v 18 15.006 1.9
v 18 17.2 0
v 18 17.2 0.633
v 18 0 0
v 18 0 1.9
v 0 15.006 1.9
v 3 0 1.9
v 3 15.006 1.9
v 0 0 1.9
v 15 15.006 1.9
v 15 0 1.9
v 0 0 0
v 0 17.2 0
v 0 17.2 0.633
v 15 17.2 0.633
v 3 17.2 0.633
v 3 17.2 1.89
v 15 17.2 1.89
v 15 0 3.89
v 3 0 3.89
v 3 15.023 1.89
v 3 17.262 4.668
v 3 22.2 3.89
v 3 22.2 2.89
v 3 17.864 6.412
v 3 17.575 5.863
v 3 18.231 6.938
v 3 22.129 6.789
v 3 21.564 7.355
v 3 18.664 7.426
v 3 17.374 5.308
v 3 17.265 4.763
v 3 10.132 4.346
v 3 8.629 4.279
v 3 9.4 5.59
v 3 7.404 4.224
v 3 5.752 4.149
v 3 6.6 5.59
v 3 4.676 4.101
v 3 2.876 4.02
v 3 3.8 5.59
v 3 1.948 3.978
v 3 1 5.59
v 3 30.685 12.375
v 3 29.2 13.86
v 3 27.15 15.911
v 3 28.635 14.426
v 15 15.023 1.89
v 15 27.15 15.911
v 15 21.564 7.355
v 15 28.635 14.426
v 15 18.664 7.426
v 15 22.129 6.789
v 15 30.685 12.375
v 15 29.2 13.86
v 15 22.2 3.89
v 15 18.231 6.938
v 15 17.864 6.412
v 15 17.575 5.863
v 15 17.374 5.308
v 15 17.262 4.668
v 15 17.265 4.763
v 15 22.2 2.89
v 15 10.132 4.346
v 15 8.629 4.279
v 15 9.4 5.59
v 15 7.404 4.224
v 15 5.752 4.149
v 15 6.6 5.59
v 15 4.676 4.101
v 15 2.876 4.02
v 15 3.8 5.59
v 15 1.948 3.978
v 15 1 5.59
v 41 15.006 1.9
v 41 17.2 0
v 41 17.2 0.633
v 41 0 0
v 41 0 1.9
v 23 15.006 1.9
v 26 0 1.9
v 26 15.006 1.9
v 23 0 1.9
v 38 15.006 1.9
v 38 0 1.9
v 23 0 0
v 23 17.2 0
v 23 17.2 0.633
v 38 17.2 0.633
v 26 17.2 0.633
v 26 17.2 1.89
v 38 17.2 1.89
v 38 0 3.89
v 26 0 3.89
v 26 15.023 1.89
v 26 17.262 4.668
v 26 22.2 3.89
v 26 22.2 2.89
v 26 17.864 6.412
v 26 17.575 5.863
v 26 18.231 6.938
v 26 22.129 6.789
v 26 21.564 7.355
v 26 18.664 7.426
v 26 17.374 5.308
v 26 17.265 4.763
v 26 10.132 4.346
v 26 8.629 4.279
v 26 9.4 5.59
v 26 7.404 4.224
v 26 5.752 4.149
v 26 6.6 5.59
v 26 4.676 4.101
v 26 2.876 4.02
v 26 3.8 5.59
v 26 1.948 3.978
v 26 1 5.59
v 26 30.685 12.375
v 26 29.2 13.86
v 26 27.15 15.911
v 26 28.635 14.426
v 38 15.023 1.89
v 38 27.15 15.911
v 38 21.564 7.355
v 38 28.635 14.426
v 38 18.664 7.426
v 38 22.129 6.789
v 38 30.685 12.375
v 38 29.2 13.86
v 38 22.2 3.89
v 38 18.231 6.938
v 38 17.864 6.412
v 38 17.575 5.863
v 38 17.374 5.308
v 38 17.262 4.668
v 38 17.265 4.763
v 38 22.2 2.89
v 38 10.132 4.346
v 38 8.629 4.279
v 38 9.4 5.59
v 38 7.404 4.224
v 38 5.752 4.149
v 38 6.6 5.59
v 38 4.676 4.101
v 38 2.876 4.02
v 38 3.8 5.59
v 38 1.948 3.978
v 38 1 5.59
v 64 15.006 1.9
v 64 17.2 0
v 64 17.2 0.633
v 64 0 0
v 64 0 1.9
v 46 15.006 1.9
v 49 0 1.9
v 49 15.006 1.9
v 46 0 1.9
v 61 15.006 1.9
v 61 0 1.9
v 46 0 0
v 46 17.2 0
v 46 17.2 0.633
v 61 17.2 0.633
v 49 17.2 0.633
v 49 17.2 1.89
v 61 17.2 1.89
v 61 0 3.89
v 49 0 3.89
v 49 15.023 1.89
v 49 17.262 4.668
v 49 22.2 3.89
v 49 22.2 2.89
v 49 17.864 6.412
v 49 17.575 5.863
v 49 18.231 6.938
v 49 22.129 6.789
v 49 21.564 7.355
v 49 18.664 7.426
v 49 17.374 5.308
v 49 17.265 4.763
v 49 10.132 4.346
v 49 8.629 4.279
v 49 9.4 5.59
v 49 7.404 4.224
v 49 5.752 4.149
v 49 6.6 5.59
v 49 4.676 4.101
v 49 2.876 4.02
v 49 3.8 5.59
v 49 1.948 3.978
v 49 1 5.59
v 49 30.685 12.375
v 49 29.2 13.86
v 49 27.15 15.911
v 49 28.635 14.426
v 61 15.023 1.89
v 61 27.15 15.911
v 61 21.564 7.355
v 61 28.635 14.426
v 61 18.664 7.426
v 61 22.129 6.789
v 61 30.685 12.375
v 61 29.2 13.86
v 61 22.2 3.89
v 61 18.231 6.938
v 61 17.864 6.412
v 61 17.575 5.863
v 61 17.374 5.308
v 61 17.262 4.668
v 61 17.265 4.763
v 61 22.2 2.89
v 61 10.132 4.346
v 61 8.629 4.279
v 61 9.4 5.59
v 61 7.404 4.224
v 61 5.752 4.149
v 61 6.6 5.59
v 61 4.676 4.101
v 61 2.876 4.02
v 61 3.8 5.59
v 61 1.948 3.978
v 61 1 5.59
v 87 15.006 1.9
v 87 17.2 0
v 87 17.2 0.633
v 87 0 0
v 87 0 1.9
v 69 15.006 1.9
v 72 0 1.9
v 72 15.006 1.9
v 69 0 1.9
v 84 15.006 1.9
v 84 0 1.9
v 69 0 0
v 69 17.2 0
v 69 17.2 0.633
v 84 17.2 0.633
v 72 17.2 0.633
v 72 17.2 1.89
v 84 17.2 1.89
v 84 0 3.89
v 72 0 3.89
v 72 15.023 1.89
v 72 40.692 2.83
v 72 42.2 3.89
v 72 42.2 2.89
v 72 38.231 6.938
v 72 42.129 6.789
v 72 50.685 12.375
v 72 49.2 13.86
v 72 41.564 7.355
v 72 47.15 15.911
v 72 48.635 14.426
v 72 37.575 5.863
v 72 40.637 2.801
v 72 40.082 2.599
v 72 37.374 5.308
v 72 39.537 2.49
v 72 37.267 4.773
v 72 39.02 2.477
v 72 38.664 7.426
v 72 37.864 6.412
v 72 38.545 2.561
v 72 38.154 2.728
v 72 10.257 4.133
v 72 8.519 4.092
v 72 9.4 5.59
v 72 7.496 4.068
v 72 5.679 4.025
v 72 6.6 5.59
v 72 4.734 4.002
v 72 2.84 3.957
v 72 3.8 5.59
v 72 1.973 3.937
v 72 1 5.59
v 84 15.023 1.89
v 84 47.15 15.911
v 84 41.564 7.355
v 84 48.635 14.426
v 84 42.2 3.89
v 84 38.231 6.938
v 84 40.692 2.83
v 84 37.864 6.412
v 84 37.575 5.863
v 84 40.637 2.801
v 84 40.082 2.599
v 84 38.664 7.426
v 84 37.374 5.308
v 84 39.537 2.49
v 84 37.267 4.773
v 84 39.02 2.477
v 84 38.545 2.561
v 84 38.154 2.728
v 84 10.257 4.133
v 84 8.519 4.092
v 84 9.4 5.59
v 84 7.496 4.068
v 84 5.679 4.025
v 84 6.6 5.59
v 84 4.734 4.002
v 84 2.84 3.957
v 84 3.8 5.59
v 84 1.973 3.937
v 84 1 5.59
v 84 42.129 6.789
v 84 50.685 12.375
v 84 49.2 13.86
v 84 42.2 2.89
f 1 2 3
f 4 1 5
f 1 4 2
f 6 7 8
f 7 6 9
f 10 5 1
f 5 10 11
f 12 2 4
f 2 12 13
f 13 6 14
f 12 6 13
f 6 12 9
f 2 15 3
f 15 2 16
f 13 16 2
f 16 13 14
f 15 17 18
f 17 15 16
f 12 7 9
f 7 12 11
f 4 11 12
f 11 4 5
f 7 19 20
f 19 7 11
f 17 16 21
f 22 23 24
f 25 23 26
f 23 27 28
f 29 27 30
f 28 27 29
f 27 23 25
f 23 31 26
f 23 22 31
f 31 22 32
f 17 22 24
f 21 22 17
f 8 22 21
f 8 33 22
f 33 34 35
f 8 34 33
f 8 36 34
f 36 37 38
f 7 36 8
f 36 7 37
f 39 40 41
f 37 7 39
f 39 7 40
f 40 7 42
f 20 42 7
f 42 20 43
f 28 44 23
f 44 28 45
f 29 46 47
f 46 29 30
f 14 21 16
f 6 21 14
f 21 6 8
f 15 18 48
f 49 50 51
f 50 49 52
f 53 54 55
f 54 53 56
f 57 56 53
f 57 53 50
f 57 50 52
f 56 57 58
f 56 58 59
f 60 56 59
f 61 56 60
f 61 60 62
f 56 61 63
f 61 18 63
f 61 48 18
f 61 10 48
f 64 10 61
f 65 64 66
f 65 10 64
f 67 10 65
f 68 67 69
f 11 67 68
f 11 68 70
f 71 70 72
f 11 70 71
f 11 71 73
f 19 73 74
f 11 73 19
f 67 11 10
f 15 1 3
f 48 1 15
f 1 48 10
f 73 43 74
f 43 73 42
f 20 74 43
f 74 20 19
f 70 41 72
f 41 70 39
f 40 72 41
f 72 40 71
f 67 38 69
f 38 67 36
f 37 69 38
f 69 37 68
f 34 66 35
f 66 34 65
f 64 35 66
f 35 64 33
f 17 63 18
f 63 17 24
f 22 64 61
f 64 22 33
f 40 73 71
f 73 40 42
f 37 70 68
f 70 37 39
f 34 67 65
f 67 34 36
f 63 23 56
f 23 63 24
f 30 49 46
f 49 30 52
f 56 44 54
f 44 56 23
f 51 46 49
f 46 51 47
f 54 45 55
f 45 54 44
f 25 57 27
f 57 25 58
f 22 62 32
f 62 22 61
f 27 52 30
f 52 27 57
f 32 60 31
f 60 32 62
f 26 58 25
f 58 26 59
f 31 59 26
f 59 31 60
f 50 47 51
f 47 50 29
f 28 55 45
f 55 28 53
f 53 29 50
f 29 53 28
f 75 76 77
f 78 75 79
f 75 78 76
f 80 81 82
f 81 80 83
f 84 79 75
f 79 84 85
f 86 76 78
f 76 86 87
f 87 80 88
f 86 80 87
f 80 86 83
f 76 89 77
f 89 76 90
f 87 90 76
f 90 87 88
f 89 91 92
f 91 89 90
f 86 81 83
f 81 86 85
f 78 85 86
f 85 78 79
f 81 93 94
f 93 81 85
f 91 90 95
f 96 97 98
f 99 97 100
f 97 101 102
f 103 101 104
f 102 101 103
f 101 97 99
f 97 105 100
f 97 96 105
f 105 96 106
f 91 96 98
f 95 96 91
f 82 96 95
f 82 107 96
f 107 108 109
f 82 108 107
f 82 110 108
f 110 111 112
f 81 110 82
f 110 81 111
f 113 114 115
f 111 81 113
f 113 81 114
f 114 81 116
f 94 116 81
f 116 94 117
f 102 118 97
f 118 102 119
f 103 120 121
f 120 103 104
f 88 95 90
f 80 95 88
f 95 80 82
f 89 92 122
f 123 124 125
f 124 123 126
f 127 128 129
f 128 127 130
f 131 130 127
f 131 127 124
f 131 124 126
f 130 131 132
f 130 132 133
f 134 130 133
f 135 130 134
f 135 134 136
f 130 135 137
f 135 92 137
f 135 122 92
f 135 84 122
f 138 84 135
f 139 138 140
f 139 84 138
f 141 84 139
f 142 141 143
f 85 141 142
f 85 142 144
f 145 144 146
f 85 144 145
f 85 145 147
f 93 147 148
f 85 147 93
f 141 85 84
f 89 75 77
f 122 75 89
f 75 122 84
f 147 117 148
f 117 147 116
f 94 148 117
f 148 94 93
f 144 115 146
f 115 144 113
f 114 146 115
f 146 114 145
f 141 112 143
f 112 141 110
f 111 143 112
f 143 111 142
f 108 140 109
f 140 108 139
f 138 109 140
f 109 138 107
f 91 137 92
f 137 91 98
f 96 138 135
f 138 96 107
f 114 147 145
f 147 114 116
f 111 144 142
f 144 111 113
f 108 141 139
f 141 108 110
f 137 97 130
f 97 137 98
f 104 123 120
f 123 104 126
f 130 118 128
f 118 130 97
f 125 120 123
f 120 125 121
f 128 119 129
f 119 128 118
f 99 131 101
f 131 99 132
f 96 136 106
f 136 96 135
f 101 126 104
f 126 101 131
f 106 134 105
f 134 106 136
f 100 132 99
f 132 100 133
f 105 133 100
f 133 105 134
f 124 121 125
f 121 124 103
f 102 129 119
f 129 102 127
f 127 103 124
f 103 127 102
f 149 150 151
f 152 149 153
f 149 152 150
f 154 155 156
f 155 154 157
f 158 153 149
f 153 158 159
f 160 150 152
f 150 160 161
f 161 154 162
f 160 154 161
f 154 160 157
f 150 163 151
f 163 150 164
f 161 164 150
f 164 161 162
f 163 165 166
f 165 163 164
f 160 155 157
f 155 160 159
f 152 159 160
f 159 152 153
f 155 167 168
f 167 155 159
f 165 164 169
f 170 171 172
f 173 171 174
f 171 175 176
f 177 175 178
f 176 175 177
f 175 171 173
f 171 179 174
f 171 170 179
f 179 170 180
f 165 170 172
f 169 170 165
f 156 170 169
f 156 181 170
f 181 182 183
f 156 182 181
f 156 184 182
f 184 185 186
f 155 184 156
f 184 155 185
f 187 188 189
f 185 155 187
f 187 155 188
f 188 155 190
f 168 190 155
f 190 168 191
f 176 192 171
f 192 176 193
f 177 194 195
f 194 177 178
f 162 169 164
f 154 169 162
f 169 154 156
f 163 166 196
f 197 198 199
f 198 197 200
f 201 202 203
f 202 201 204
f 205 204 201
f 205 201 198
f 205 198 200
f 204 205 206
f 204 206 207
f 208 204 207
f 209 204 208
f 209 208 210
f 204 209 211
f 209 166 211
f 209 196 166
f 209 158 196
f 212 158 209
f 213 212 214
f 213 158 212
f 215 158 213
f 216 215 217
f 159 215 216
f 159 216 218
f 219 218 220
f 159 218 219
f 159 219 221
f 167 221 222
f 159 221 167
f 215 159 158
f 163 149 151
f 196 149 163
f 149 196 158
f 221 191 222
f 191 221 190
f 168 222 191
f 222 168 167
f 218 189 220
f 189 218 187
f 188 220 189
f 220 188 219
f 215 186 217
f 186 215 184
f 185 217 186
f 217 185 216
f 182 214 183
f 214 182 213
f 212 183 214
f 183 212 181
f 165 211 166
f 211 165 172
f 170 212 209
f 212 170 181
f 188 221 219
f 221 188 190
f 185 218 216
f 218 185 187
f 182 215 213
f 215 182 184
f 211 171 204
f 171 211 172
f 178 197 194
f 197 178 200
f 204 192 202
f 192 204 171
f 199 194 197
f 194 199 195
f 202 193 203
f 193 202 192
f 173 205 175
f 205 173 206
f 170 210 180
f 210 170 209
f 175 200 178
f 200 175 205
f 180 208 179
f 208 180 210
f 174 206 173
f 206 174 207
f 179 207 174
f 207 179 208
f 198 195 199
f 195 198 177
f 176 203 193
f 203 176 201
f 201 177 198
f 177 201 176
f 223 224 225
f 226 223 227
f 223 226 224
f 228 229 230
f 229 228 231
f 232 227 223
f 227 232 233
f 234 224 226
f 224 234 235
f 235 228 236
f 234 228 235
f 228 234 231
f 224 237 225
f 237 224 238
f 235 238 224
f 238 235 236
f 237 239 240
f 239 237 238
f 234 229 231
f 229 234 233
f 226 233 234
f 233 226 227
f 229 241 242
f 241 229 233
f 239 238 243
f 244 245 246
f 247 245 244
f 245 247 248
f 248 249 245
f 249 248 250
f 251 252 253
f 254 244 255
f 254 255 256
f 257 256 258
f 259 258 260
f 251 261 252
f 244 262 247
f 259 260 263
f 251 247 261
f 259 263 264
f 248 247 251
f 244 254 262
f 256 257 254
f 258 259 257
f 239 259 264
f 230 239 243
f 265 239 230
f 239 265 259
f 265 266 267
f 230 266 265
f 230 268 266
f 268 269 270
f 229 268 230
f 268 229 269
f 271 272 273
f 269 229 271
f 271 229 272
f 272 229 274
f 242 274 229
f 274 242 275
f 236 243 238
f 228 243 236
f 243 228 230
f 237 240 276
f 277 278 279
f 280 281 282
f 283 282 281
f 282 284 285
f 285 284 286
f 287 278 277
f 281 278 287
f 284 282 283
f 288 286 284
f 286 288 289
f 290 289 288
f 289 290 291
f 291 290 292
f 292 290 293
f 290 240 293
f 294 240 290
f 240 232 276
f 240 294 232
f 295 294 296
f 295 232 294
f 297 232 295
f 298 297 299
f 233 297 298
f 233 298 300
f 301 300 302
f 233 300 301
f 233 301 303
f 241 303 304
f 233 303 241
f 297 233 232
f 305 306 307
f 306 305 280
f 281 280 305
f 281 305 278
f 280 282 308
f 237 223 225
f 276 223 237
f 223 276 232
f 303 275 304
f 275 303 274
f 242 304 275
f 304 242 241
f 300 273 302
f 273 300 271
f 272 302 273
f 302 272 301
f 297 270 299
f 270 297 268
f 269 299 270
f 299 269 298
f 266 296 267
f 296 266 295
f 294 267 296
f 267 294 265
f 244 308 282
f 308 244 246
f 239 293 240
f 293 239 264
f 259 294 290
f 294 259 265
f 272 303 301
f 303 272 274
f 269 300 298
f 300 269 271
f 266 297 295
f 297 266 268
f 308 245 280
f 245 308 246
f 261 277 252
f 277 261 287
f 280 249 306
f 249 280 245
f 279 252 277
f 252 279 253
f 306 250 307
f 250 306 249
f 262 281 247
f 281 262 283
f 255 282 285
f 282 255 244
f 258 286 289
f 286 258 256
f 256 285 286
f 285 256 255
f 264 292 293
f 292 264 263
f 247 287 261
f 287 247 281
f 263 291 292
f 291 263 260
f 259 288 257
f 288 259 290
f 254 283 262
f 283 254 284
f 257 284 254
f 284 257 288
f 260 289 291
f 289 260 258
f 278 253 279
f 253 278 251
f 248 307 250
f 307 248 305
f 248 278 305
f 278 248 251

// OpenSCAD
// file: hotshoe_paper_clip.scad
hs_w      = 18.0;
hs_l      = 17.2;
hs_h      = 1.9; // 2
hs2_w     = 12;
//hs2_l     = hs_l+5;
hs2_h     = 2;
hs2_x_off = (hs_w-hs2_w)/2;
hs2_elev  = 1;
hs3_l     = 12;
hs3_h     = 5;
hs3_w     = 0.8;

module hotshoe(
    logofile="", logooffset=1,
    len=5
    ) {
    hs2_l = hs_l+len;
    union() {
        // lower hotshoe
        difference() {
            cube([hs_w, hs_l, hs_h]);
            translate([-1,hs_l,hs_h/3]) rotate([60,0,0]) cube([hs2_x_off+1, 10,10]);
            translate([hs2_x_off+hs2_w,hs_l,hs_h/3]) rotate([60,0,0]) cube([hs2_x_off+1, 10,10]);
        }
        // upper plate including grip
        translate([hs2_x_off, 0, hs_h-0.01]) {
            rotate([90,0,90])
            linear_extrude(height=hs2_w) {
                polygon(
                points=[[0,0], [hs2_l,0], [hs_l,0], [hs2_l,hs2_elev],[hs2_l,hs2_elev+hs2_h],
                //[hs_l,hs2_h],
                [0,hs2_h]],
                paths=[[0,1,2,3,4,5,6]]
                );
            }
            for ( i = [0:3]) {
                translate([hs2_w/2,1+2.8*(i),hs2_h]) scale([1,1,1.7]) rotate([45,0,0]) cube([hs2_w,sqrt(2), sqrt(2)], center=true);
            }
        }
        translate([hs2_x_off, hs2_l, hs_h+hs2_elev+hs2_h/2-0.01])
        rotate([45,0,0])
        difference() {
            union() {
                // Logo
                translate([logooffset,1,hs3_h-1]) linear_extrude(height=1+1) import(file=logofile);
                // clasp
                cube([hs2_w, hs3_l, hs3_h]);
                translate([0,0,hs3_h/2]) scale([1,1.5,1]) rotate([0,90,0]) cylinder(h=hs2_w, r=hs3_h/2, $fn=36);
            }
            translate([-1,2,(hs3_h-hs3_w)/2]) cube([hs2_w+2, hs3_l, hs3_w]);
        }
    }
}
// main file
include <hotshoe_paper_clip.scad>

offset=23;

translate([0*offset,0,0]) hotshoe(logofile="HR.dxf", logooffset=1);
translate([1*offset,0,0]) hotshoe(logofile="IR.dxf", logooffset=3.5);
translate([2*offset,0,0]) hotshoe(logofile="WR.dxf", logooffset=1);
translate([3*offset,0,0]) hotshoe(logofile="EE.dxf", logooffset=2,len=25);
